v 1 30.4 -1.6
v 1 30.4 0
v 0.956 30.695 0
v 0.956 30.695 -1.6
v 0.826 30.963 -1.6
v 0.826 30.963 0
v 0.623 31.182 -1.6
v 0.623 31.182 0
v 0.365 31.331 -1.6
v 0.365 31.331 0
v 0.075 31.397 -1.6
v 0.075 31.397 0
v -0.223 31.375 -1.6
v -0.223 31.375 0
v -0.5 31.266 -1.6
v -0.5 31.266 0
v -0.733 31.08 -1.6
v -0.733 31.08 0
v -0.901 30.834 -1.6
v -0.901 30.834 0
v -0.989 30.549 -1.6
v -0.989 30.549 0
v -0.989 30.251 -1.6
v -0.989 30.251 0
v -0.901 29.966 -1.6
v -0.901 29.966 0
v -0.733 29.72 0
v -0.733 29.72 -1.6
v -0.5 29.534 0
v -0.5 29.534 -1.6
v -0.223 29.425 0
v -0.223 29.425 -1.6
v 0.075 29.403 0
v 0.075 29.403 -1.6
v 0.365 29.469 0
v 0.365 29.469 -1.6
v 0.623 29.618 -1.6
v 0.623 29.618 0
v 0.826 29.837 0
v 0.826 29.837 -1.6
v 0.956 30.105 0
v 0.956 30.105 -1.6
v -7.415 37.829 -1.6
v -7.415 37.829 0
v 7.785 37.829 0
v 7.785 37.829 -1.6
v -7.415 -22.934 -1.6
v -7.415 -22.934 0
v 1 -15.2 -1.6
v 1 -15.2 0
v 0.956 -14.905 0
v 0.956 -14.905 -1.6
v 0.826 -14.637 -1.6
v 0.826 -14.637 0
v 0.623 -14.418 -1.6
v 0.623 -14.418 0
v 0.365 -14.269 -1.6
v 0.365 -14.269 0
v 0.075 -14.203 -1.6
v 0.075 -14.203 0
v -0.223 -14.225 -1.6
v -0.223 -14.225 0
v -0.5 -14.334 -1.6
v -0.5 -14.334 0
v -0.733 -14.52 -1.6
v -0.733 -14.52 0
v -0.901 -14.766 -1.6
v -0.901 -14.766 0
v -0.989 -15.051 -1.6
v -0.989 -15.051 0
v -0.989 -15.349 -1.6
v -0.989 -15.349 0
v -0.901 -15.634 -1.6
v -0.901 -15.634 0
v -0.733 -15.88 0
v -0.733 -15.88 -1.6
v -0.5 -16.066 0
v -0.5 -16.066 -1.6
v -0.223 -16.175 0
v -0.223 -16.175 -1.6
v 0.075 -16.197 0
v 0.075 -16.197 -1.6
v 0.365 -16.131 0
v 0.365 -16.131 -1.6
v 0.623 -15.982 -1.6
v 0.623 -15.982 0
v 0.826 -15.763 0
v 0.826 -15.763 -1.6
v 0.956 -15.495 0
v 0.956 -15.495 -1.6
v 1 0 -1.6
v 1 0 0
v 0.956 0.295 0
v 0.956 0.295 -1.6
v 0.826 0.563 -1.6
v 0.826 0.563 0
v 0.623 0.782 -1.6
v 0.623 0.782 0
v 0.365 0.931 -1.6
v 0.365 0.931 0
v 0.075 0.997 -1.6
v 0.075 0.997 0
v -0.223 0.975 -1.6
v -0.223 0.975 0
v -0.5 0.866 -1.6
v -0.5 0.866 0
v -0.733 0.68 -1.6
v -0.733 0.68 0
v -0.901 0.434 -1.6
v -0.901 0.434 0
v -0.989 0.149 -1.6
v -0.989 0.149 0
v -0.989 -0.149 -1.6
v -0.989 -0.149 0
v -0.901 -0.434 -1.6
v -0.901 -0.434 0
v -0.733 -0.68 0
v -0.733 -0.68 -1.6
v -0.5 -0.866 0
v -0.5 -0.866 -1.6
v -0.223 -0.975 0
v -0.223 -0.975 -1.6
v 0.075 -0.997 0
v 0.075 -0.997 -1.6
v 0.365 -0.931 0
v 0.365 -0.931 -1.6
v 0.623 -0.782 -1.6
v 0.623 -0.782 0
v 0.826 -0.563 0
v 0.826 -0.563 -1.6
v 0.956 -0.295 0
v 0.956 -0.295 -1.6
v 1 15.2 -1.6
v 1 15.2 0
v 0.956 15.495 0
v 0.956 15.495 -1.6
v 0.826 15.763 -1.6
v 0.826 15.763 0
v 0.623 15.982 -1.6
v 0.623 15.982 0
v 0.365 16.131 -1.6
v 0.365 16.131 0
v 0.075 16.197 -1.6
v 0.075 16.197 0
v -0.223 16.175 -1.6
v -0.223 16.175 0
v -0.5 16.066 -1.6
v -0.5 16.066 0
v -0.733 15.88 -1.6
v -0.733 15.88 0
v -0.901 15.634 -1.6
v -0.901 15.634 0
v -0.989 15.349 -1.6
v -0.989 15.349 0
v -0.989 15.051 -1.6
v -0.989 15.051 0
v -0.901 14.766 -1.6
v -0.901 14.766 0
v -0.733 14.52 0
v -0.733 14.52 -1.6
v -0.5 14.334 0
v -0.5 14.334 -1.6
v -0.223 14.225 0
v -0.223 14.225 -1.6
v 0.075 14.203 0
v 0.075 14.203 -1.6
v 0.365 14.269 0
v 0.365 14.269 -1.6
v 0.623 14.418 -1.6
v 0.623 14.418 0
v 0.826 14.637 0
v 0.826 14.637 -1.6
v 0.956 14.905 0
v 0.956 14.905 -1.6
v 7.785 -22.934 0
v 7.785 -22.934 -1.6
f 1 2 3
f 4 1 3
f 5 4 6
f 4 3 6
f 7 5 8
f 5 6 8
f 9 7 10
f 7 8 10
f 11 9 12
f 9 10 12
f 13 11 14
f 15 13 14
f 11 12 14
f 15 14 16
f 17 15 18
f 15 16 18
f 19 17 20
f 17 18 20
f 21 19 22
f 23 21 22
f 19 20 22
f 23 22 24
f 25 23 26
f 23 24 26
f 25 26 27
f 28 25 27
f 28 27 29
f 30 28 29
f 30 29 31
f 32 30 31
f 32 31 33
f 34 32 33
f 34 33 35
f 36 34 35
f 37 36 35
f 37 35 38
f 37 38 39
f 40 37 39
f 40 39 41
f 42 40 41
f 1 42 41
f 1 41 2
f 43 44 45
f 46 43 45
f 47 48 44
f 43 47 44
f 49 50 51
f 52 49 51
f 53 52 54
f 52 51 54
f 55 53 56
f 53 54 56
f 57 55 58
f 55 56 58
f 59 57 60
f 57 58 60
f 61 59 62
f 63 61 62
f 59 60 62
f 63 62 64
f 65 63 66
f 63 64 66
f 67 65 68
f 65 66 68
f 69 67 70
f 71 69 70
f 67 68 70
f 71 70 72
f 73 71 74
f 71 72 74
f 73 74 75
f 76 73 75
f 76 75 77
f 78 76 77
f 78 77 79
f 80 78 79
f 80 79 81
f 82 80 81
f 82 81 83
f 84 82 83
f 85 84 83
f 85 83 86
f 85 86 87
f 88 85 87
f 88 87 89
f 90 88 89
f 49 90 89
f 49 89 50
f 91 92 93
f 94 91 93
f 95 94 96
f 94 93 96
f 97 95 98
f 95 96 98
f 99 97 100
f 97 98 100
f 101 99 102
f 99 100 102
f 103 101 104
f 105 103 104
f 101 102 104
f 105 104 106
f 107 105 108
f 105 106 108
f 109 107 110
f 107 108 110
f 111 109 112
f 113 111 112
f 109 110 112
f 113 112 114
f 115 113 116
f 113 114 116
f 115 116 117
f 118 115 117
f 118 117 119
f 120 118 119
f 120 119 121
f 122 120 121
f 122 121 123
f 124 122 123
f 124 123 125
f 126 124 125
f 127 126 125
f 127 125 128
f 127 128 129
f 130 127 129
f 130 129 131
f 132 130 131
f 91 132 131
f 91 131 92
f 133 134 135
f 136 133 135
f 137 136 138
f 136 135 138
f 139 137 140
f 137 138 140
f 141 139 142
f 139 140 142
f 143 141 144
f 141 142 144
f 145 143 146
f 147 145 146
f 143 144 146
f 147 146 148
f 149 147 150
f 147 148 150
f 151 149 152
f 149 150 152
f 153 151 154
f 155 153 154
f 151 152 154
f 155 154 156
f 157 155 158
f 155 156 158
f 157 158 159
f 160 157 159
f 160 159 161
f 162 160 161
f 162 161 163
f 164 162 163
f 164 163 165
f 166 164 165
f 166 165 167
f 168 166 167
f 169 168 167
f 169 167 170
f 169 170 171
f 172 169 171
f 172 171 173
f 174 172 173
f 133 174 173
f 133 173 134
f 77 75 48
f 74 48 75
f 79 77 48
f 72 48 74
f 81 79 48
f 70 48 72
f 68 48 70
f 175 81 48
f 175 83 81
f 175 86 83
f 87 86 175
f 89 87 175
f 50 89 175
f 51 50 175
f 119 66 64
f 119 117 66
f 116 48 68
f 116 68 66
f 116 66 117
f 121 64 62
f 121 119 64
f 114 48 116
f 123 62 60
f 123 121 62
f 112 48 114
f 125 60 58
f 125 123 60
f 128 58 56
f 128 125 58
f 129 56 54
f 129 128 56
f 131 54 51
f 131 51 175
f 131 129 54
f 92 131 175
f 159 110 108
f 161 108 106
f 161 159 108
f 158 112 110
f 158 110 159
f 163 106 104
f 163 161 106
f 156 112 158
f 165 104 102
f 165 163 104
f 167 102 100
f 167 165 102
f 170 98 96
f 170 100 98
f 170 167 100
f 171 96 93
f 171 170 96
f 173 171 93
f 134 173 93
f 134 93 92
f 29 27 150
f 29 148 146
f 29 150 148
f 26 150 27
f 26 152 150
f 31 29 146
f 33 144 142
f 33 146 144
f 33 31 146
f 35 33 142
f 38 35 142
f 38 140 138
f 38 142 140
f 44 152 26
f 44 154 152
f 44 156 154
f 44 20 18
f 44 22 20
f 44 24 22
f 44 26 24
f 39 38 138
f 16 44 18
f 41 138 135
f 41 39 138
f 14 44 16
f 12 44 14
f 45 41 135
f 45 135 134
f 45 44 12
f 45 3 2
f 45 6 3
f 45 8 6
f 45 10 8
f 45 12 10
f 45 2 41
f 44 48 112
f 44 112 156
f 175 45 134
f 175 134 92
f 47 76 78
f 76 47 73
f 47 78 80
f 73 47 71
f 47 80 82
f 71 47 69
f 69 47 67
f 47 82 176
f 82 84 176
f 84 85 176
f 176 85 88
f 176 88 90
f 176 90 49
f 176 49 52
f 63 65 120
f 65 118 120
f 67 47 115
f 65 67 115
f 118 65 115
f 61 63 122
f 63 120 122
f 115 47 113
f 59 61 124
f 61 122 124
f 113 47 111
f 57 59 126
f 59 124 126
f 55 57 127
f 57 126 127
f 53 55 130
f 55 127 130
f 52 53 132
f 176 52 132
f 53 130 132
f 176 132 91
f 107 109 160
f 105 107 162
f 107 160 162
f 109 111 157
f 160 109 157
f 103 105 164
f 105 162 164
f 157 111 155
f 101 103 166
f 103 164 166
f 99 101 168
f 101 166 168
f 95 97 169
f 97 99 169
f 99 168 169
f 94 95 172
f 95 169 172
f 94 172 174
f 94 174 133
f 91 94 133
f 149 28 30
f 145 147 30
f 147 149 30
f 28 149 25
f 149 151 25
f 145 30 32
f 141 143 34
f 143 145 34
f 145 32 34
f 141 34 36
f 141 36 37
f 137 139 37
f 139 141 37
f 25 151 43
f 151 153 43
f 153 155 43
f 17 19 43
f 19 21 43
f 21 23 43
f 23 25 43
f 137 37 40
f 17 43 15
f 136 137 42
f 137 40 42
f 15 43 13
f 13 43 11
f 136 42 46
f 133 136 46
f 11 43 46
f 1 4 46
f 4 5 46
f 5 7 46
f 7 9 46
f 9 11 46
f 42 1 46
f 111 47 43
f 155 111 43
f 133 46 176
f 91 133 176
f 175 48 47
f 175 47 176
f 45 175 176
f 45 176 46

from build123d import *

# Parameters (mm, degrees)
F1_W     = 15.2
F1_H     = 60.76299
F2_DEPTH = 1.6
F0_R     = 1
F3_DEPTH = 25


with BuildPart() as f2:
    # F1 (on Top) → F2 (new body)
    with BuildSketch(Plane.XY):
        with Locations((0.184545, 7.447379)):
            Rectangle(F1_W, F1_H)
    extrude(amount=-F2_DEPTH)

    # F0 (on Top) → F3 (cut)
    with BuildSketch(Plane.XY):
        Circle(F0_R)
        with Locations((0, 15.2)):
            Circle(F0_R)
        with Locations((0, 30.4)):
            Circle(F0_R)
        with Locations((0, -15.2)):
            Circle(F0_R)
    extrude(amount=-F3_DEPTH, mode=Mode.SUBTRACT)


solid = f2.part
